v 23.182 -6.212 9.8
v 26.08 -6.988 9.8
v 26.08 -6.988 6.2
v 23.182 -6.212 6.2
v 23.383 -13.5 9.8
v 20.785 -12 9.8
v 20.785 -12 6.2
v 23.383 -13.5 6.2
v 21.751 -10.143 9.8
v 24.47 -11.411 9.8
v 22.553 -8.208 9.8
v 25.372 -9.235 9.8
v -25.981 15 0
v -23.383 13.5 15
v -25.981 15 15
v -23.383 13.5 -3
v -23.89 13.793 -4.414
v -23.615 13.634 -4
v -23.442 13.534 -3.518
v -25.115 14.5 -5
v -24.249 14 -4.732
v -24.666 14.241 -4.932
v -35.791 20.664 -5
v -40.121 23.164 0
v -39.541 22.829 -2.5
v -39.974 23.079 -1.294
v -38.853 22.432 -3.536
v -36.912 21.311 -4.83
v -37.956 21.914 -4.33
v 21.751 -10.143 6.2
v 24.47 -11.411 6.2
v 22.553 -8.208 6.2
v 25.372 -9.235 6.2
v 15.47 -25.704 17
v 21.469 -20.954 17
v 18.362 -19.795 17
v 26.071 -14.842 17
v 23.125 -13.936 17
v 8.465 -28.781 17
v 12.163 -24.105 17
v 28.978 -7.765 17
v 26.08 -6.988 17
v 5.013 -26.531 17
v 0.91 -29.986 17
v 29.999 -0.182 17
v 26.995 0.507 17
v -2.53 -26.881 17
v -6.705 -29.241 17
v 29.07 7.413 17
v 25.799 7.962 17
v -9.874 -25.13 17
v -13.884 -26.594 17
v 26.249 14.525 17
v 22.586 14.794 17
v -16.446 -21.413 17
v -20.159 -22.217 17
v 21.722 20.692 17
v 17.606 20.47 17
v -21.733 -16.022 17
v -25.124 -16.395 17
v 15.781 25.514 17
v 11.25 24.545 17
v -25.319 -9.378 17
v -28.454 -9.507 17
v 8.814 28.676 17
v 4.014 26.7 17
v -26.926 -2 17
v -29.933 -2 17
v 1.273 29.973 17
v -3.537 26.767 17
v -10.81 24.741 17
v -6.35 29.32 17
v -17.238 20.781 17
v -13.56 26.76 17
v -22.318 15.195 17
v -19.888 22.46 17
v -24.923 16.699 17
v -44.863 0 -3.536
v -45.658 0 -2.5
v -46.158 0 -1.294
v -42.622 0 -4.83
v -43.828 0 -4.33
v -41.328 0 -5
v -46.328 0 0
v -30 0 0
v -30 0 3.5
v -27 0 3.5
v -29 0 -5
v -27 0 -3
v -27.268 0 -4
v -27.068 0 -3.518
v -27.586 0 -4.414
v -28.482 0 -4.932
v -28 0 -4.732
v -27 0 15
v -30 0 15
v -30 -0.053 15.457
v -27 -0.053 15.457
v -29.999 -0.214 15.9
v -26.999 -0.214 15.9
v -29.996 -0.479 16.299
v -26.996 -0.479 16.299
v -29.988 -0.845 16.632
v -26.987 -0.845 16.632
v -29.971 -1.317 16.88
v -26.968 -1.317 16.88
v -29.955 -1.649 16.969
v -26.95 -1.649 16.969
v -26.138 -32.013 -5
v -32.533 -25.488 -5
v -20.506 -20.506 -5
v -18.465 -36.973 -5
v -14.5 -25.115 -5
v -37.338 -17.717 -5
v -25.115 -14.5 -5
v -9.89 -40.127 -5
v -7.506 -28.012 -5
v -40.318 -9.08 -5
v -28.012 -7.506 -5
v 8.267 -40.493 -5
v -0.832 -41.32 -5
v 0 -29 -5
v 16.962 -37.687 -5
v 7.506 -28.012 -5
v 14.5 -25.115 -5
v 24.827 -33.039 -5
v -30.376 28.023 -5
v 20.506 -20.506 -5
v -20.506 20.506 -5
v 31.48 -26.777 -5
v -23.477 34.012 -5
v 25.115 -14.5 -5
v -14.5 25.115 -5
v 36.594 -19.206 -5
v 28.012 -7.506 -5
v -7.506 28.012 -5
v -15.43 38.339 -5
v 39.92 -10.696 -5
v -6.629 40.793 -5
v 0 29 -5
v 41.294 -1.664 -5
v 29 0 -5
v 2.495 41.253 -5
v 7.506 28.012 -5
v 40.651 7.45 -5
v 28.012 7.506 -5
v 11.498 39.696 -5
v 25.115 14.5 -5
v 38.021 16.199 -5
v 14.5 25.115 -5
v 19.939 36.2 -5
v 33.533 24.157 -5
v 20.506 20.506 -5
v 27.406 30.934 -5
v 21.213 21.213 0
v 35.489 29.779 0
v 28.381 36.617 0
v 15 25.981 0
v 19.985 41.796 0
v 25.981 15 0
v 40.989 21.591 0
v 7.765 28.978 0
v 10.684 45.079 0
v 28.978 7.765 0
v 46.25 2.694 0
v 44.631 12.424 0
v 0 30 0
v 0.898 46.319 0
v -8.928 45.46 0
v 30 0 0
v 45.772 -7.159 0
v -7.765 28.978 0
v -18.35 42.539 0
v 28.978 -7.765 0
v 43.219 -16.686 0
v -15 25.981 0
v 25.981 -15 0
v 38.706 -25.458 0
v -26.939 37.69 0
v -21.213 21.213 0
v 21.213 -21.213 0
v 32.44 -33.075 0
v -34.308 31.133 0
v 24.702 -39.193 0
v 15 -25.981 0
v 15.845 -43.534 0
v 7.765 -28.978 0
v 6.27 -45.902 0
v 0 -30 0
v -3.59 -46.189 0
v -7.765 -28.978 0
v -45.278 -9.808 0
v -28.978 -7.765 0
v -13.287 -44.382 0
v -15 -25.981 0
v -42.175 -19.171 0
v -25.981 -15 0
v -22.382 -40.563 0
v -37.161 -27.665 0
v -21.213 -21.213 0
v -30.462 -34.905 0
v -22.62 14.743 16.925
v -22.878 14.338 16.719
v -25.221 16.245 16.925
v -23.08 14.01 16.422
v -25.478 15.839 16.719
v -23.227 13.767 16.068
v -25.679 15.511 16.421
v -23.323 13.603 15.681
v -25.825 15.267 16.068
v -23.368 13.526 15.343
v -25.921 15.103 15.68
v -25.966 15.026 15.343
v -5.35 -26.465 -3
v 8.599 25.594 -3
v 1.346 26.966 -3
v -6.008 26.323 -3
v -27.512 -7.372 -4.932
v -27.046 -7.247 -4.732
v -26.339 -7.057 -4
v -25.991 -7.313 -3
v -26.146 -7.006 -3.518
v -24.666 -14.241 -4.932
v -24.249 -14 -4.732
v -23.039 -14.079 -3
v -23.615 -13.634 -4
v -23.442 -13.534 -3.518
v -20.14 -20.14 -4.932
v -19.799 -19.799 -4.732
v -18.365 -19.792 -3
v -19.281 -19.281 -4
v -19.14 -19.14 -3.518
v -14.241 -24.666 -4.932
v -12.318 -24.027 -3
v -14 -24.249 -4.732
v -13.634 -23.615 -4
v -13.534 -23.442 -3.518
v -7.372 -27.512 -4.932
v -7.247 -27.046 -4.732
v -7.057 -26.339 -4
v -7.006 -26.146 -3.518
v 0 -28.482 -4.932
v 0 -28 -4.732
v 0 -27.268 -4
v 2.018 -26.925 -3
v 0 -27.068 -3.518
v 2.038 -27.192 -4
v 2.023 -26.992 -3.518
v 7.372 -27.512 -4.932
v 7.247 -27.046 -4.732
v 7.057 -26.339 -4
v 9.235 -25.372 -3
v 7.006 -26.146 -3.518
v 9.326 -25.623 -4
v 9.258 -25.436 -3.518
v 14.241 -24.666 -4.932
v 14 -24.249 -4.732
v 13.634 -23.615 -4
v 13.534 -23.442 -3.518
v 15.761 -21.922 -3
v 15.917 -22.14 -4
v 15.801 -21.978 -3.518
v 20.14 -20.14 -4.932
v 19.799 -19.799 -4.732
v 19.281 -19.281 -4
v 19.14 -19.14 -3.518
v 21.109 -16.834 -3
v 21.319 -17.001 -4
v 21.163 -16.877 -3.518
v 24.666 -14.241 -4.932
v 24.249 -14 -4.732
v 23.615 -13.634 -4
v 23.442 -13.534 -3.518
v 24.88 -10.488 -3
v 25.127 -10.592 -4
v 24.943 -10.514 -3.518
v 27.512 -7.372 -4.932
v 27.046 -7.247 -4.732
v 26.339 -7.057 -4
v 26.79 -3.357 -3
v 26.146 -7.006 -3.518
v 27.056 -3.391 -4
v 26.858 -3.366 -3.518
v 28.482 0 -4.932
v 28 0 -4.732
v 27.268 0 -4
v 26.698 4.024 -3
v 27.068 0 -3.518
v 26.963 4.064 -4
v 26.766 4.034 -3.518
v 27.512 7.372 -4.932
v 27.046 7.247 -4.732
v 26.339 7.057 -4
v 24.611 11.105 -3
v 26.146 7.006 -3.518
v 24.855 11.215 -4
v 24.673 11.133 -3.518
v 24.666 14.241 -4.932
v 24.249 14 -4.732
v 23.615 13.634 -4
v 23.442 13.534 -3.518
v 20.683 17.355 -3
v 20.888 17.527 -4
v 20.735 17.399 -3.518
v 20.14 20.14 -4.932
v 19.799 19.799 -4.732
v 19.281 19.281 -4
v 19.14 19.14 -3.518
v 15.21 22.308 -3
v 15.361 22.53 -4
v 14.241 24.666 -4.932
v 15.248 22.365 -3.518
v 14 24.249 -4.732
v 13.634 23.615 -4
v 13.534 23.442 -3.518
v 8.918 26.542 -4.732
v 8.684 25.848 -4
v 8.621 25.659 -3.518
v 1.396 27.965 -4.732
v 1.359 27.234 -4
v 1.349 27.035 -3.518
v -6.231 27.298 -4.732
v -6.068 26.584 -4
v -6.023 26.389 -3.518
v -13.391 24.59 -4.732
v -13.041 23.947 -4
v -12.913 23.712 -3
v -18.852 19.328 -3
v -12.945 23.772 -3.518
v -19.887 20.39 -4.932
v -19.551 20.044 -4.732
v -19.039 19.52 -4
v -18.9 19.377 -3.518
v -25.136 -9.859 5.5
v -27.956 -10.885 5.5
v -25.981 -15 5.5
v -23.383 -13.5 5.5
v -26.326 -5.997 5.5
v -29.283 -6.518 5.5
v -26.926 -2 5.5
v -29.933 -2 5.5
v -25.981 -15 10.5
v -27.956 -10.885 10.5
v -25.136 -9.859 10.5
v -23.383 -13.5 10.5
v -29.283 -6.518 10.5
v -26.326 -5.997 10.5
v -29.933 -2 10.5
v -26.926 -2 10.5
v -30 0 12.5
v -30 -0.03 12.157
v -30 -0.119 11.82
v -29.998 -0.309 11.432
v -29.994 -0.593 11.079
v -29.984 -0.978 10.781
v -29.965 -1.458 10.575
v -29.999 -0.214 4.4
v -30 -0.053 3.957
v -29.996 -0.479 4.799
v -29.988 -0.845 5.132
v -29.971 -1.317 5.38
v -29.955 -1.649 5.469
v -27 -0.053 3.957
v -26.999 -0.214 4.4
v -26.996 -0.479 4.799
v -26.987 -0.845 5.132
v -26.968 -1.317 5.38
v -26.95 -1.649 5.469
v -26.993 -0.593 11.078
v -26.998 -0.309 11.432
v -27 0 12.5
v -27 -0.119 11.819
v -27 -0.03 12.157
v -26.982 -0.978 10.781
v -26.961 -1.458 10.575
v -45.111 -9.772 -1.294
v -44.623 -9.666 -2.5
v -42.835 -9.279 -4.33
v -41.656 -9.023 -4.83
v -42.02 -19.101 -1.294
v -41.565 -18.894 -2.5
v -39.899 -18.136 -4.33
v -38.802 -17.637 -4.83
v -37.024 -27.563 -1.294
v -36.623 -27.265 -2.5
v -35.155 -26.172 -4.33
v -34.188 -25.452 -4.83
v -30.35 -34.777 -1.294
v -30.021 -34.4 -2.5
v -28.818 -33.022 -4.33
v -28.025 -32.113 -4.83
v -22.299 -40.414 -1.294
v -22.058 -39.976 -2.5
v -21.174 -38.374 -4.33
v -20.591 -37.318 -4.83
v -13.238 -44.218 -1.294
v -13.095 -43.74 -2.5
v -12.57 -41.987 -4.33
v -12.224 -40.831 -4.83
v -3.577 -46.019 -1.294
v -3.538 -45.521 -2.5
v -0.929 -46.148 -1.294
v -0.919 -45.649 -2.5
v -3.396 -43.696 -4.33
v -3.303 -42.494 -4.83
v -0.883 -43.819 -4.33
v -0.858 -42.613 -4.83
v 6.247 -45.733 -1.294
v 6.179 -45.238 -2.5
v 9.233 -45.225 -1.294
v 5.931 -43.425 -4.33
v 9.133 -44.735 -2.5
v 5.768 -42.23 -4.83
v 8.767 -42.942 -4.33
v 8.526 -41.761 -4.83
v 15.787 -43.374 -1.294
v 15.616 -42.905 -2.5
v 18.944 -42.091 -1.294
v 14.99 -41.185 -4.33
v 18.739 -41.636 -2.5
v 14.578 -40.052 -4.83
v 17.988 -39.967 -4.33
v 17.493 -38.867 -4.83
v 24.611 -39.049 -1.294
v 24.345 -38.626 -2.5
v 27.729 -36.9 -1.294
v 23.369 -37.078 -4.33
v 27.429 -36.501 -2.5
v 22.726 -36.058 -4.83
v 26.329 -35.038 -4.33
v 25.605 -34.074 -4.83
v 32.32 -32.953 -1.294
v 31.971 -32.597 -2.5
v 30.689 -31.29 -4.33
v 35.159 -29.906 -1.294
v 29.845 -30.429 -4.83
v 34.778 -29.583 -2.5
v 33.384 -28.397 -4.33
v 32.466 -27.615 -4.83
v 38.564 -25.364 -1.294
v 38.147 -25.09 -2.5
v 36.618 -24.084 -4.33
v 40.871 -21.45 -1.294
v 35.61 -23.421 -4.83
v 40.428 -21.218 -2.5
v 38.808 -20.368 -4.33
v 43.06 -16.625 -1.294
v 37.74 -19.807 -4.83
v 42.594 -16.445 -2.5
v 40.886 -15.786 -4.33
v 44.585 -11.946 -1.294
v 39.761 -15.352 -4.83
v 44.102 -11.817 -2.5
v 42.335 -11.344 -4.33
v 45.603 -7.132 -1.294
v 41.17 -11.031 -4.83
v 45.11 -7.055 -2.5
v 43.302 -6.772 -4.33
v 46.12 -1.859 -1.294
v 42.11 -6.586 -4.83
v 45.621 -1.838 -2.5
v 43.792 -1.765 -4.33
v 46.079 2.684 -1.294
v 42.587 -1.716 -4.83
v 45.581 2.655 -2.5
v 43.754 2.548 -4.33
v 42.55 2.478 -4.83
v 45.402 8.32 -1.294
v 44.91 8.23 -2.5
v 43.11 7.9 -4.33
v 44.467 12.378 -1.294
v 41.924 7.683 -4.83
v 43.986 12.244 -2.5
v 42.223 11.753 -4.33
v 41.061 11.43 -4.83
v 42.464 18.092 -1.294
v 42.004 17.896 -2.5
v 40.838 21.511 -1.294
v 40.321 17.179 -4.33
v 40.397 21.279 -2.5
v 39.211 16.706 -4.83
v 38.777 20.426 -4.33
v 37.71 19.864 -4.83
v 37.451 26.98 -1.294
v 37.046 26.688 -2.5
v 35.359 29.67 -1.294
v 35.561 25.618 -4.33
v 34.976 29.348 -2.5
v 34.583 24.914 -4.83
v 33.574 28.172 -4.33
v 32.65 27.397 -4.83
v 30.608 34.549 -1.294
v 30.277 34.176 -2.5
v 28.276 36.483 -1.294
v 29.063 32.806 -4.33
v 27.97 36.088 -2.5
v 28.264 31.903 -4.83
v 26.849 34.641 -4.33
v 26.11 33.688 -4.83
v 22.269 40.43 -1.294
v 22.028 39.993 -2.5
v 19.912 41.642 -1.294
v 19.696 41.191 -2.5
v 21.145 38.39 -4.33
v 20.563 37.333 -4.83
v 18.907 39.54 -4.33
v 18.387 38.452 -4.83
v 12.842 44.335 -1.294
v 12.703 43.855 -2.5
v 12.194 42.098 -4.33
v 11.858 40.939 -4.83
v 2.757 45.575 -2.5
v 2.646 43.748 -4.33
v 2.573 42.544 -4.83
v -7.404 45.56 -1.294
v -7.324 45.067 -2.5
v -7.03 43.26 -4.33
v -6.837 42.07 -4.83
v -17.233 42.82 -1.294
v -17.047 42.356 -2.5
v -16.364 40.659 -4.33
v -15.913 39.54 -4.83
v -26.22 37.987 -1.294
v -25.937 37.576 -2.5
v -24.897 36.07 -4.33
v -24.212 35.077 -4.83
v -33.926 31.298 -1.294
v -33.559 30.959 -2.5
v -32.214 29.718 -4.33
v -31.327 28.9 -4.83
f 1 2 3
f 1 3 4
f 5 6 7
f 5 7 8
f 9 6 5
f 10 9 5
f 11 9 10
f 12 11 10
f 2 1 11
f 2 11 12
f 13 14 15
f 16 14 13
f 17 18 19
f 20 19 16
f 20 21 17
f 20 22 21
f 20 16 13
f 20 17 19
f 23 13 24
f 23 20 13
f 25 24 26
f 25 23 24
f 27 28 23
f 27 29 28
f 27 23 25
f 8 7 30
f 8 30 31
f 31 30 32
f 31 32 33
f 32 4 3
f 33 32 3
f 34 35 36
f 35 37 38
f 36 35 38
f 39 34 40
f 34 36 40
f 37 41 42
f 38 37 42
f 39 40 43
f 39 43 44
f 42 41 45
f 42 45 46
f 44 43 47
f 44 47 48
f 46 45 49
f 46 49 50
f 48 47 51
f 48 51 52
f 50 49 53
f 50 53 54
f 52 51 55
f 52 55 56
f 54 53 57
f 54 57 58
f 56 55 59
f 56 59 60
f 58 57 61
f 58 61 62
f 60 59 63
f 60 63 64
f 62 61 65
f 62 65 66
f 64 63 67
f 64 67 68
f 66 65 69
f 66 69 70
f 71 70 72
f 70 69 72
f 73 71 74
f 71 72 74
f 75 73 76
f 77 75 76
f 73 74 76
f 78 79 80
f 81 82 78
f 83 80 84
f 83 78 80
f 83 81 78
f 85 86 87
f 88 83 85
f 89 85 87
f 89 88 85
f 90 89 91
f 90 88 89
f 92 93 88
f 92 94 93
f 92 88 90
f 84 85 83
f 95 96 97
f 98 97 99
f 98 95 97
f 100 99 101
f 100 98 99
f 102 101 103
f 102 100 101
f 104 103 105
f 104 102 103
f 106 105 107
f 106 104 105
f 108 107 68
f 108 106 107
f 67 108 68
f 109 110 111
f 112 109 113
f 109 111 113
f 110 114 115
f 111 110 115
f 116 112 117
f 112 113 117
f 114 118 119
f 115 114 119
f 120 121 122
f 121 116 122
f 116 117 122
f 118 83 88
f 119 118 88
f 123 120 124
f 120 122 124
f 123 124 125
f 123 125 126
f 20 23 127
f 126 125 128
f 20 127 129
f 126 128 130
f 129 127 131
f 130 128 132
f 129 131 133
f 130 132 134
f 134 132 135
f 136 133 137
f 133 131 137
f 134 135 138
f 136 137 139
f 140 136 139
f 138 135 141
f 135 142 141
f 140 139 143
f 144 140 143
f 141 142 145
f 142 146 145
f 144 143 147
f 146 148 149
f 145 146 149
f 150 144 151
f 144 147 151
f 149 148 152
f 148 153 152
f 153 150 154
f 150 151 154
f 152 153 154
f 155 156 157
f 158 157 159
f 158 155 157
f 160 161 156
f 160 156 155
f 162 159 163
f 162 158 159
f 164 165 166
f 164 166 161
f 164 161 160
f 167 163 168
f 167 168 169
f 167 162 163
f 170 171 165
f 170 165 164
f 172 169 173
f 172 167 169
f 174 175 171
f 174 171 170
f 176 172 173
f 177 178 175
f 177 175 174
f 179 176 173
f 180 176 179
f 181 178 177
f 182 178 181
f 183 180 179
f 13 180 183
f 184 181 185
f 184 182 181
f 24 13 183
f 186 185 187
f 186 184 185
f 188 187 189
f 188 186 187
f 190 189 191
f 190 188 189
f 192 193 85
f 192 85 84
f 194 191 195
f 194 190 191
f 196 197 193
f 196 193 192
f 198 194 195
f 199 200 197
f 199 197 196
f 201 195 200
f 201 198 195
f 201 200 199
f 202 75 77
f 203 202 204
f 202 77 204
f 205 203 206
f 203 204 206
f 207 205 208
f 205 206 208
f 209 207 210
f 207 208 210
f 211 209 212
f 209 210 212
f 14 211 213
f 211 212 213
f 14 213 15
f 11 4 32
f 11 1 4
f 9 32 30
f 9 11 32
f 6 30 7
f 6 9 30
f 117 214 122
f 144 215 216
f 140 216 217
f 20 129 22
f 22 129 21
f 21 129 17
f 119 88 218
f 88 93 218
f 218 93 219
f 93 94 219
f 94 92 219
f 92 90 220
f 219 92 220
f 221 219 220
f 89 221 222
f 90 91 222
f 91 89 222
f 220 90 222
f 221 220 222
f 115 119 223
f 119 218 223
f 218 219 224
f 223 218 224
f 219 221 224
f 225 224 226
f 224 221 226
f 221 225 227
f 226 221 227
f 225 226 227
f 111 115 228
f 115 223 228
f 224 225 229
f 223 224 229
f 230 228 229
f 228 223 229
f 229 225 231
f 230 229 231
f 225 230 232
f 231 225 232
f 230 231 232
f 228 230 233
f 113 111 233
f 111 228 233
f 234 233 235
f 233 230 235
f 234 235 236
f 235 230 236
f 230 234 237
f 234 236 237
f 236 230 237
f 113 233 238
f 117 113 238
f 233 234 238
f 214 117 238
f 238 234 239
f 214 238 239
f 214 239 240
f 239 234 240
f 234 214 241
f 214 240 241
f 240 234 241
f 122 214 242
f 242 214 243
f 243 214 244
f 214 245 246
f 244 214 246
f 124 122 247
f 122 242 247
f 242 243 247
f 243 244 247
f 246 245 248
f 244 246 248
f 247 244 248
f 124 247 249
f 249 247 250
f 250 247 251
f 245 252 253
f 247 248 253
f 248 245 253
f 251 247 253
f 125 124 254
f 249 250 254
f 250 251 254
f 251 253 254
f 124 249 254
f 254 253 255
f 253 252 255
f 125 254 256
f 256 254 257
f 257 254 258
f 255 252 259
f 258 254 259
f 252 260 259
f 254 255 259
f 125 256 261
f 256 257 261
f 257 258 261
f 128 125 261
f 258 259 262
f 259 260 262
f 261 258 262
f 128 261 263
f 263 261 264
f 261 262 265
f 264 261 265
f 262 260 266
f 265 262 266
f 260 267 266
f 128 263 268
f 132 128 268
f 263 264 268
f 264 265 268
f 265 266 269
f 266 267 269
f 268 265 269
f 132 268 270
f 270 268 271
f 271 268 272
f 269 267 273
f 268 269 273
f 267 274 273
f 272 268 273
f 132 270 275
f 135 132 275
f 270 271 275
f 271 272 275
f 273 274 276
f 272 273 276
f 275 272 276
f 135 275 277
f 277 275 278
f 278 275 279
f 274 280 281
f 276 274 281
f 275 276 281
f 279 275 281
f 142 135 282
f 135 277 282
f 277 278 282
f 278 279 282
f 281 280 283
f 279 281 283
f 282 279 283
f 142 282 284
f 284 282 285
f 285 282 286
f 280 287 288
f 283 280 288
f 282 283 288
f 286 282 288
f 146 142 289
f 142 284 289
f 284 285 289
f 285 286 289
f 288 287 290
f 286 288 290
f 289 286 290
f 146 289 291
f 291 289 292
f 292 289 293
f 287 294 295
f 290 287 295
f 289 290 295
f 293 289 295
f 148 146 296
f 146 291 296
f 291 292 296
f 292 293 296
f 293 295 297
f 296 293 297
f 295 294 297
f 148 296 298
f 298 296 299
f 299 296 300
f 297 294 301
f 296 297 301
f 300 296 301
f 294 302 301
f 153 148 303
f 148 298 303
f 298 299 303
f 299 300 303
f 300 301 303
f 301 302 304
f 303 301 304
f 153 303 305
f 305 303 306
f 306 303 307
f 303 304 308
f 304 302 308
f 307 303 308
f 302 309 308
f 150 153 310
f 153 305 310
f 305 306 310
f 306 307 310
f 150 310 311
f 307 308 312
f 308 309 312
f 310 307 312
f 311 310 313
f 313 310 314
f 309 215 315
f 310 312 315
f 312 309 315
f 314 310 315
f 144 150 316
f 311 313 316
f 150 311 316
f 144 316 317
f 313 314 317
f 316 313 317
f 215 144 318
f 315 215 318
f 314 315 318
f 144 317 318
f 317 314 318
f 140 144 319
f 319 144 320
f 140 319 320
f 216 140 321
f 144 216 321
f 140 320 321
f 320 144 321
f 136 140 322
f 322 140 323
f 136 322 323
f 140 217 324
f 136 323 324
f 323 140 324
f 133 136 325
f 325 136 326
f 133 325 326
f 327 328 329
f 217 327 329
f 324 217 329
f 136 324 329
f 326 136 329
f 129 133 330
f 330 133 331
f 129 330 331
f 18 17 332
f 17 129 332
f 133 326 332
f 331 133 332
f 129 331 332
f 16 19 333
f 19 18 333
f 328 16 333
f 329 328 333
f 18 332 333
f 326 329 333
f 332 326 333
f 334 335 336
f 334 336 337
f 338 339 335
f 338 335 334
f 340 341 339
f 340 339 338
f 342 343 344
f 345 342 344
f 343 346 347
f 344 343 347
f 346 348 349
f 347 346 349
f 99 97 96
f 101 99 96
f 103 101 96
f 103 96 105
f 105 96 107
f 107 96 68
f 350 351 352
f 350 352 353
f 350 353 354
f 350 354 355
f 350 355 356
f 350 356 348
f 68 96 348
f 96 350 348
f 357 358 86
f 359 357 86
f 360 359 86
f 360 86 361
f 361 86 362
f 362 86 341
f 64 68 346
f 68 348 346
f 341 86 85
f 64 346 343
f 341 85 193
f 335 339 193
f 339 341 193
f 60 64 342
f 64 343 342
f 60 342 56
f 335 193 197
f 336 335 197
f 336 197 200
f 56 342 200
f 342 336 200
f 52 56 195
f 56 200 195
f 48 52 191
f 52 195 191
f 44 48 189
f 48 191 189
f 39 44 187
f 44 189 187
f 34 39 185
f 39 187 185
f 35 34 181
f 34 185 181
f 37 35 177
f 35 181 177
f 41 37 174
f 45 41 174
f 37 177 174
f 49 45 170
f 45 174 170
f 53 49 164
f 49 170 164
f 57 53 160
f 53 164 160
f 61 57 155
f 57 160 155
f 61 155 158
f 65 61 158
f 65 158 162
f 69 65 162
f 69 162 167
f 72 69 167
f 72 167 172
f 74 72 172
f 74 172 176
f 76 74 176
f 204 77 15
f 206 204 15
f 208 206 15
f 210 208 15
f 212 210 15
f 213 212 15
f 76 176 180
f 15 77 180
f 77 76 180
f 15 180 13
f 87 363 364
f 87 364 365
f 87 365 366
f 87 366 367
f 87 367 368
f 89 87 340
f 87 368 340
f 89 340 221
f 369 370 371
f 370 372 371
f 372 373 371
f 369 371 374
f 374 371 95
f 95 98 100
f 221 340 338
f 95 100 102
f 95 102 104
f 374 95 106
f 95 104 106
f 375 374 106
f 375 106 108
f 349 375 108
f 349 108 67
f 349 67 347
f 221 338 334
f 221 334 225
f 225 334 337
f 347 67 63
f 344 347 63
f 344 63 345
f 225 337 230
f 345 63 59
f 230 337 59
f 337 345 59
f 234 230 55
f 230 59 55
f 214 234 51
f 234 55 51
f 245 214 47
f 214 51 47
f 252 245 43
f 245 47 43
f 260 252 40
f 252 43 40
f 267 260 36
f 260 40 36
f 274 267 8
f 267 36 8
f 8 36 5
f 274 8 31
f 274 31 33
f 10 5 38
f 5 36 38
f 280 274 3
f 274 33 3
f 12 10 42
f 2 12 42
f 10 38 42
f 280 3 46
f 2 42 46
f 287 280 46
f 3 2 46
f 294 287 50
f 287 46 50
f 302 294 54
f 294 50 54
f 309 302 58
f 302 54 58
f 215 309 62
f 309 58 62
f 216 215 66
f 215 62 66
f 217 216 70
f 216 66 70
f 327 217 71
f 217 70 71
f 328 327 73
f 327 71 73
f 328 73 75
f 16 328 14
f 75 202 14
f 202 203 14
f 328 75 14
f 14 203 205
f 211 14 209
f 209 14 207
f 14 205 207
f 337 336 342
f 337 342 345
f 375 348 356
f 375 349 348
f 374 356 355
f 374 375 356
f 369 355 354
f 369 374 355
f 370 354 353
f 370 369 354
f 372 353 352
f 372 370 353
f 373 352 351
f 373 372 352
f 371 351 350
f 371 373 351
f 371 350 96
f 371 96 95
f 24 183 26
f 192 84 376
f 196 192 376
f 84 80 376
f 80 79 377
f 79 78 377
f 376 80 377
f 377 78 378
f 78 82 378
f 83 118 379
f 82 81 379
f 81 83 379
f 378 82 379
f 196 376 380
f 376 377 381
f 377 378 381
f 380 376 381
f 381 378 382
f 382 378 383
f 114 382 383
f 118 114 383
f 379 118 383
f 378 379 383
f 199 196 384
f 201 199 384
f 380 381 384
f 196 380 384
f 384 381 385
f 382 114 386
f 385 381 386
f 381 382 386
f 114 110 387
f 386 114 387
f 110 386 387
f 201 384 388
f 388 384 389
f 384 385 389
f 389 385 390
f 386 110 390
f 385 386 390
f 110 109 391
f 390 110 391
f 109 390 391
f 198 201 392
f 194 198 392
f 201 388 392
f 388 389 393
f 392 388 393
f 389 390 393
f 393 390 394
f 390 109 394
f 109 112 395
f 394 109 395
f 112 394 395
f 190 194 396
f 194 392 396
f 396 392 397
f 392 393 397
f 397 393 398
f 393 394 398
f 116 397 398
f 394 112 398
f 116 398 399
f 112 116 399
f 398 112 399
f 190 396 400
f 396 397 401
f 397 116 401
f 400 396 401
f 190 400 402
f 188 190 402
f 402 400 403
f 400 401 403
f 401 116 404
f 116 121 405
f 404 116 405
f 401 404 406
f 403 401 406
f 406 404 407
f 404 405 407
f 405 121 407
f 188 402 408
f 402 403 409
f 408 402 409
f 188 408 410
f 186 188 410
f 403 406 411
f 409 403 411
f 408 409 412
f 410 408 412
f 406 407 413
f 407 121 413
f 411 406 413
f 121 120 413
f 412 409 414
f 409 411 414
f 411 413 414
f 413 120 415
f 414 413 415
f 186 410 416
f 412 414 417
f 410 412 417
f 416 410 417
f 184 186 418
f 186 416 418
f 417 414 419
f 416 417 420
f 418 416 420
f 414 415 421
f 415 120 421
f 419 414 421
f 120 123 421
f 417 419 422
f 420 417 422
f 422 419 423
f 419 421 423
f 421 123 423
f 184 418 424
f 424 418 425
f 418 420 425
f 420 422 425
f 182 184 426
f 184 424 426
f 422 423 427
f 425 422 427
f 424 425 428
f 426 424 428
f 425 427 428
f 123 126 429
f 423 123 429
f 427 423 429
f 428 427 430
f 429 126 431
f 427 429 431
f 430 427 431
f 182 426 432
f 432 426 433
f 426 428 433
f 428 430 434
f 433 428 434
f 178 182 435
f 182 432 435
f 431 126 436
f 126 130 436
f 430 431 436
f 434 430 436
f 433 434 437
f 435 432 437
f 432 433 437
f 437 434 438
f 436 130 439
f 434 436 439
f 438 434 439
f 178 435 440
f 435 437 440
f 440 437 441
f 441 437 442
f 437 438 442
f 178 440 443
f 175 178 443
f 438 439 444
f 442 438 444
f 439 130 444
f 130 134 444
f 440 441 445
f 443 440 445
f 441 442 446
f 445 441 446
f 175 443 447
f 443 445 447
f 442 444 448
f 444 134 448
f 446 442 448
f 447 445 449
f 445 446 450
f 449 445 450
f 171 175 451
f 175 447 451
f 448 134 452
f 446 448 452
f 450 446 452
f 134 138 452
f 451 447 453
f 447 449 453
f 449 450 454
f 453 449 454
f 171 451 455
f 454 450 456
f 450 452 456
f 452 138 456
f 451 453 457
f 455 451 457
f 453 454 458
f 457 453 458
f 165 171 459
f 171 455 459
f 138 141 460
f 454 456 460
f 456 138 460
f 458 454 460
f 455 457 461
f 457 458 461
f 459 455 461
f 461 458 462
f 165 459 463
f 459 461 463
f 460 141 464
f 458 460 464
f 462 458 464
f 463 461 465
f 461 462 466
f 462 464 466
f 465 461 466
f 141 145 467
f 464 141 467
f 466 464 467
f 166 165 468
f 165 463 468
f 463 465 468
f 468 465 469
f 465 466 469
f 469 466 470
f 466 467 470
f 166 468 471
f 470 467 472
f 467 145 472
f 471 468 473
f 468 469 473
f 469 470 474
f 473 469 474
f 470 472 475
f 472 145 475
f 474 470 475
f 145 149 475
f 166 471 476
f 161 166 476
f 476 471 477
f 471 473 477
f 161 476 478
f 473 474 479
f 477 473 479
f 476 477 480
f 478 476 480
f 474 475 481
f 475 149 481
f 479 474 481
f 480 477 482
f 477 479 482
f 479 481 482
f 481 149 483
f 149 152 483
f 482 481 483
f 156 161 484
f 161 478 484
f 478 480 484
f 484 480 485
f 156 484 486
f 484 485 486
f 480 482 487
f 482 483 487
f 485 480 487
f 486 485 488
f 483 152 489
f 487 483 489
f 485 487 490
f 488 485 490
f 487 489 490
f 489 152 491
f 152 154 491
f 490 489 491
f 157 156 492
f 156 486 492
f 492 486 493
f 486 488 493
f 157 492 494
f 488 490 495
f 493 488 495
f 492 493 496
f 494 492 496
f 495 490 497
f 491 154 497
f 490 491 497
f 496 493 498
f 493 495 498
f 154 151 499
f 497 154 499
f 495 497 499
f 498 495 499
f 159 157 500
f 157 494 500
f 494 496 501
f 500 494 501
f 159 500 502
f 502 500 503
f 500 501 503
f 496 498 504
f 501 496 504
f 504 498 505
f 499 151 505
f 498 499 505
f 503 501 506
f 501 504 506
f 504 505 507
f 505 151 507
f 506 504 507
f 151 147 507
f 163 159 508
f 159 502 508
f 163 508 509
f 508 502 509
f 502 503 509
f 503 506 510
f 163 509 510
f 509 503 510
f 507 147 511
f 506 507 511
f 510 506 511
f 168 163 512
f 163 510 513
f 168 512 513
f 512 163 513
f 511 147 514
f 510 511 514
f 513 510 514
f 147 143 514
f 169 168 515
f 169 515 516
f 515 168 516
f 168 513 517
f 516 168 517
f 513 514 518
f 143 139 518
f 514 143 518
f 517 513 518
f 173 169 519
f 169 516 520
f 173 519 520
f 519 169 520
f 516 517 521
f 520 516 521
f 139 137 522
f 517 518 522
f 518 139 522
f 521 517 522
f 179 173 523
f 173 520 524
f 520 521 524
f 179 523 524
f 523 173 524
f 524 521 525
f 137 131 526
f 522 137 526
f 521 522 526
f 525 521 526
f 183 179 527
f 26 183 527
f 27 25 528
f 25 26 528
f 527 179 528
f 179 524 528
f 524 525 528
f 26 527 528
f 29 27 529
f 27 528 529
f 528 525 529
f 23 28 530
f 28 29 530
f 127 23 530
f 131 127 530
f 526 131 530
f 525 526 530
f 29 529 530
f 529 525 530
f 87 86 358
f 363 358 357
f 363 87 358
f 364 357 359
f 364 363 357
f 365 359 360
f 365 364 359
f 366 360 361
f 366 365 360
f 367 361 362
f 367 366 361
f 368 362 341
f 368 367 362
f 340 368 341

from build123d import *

# Parameters (mm, degrees)
F3_DEPTH      = 17.001
F3_DEPTH_BACK = 25
F5_ANGLE      = -180
F7_DEPTH      = 1.8
F8_DEPTH      = 2.5
F9_R          = 2


with BuildPart() as f1:
    # F0 (on Front) → F1 (revolve)
    with BuildSketch(Plane.XZ):
        with BuildLine():
            Line((-27, 17), (-30, 17))
            Line((-30, 17), (-30, 0))
            Line((-30, 0), (-46.3279513852, 0))
            ThreePointArc((-46.3279513852, 0), (-44.8634852911, -3.5355339059), (-41.3279513852, -5))
            Line((-41.3279513852, -5), (-29, -5))
            ThreePointArc((-29, -5), (-27.5857864376, -4.4142135624), (-27, -3))
            Line((-27, -3), (-27, 17))
        make_face()
    revolve(axis=Axis((0, 0, 7.2955568321), (0, 0, 1)))

    # F2 (on Top) → F3 (cut, two sides)
    with BuildSketch(Plane.XY) as f3_sk:
        Polygon((55.203495074, 0), (0, 0), (55.203495074, -31.8717527412), align=None)
    extrude(amount=F3_DEPTH, mode=Mode.SUBTRACT)
    extrude(f3_sk.sketch, amount=-F3_DEPTH_BACK, mode=Mode.SUBTRACT)


with BuildPart() as f1_1:
    # F5: moved
    add(f1.part.rotate(Axis((0, 0, 17), (0, 0, -1)), F5_ANGLE))

    # F6 (on offset) → F7 (join, symmetric)
    with BuildSketch(Plane.XY.offset(8)):
        with BuildLine():
            ThreePointArc((23.1822198309, -6.2116570825), (22.1731087803, -9.1844023768), (20.7846096908, -12))
            Line((20.7846096908, -12), (24.0563691046, -13.8889511783))
            Line((24.0563691046, -13.8889511783), (26.818160989, -7.1859045795))
            Line((26.818160989, -7.1859045795), (23.1822198309, -6.2116570825))
        make_face()
    extrude(amount=F7_DEPTH, both=True)

    # F6 (on offset) → F8 (cut, symmetric)
    with BuildSketch(Plane.XY.offset(8)):
        Polygon((-34.1305090562, -19.7052585912), (0, 0), (-34.9063649774, 6.3153640367), align=None)
    extrude(amount=F8_DEPTH, both=True, mode=Mode.SUBTRACT)

    # F9
    f9_edges = [f1_1.edges().sort_by_distance(p)[0] for p in [
        (-28.5, 0, 5.5),
        (-28.5, 0, 10.5),
        (-28.5, 0, 17),
        (-24.681724, 14.25, 17),
    ]]
    fillet(f9_edges, radius=F9_R)


solid = f1_1.part
